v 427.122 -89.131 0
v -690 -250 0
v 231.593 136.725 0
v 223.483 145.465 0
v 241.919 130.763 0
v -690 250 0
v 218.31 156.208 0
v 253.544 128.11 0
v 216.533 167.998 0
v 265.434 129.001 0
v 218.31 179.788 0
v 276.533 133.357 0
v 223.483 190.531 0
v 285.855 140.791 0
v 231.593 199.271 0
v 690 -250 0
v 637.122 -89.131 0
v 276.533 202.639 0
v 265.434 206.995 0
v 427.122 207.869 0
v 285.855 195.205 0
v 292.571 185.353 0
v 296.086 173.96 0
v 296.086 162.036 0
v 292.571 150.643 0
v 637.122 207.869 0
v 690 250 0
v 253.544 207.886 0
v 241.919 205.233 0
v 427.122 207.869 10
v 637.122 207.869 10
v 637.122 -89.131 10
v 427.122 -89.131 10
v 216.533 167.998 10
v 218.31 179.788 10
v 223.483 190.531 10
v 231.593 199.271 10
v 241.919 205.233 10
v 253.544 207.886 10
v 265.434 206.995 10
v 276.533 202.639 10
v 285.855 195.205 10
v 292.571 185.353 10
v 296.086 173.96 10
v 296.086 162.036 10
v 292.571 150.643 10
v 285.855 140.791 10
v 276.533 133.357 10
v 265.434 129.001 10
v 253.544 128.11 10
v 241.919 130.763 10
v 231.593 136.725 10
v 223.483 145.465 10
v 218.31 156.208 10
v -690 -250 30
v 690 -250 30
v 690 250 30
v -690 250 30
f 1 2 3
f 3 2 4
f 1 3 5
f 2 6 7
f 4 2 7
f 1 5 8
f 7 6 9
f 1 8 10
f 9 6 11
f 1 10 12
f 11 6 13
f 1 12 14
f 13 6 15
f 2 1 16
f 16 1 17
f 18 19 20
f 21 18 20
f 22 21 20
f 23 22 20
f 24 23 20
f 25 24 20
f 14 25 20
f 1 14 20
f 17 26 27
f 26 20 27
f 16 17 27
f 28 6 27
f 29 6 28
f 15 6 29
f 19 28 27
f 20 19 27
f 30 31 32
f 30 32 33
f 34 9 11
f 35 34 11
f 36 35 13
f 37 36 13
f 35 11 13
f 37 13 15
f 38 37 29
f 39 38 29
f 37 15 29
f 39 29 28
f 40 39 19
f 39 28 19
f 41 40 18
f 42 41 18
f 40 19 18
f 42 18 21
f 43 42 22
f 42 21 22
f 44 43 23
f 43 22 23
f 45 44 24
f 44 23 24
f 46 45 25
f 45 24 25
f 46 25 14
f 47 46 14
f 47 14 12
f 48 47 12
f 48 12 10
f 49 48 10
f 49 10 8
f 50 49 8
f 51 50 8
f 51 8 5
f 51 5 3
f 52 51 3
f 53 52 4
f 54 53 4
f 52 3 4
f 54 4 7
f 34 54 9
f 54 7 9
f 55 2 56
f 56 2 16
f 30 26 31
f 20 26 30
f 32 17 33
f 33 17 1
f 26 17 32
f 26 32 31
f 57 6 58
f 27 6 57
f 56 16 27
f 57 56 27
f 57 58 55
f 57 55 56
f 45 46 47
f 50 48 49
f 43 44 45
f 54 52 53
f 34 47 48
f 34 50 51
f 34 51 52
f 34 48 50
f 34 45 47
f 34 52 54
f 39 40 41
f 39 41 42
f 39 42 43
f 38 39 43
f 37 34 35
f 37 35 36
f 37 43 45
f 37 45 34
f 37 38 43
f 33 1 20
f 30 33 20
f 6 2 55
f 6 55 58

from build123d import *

# Parameters (mm, degrees)
CROQUIS1_W              = 1380
CROQUIS1_H              = 500
SALIENTE_EXTRUIR1_DEPTH = 30
CROQUIS2_R              = 40
CROQUIS2_W              = 210
CROQUIS2_H              = 297
CORTAR_EXTRUIR3_DEPTH   = 10


with BuildPart() as part:
    # Croquis1 → Saliente-Extruir1 (new body)
    with BuildSketch(Plane.XY):
        Rectangle(CROQUIS1_W, CROQUIS1_H)
    extrude(amount=SALIENTE_EXTRUIR1_DEPTH)

    # Croquis2 → Cortar-Extruir3 (cut)
    with BuildSketch(Plane(origin=(0, 0, 0), x_dir=(-1, 0, 0), z_dir=(0, 0, -1))):
        with Locations((-256.532724235, 167.997980694)):
            Circle(CROQUIS2_R)
        with Locations((-532.122165127, 59.369001894)):
            Rectangle(CROQUIS2_W, CROQUIS2_H)
    extrude(amount=-CORTAR_EXTRUIR3_DEPTH, mode=Mode.SUBTRACT)


solid = part.part
